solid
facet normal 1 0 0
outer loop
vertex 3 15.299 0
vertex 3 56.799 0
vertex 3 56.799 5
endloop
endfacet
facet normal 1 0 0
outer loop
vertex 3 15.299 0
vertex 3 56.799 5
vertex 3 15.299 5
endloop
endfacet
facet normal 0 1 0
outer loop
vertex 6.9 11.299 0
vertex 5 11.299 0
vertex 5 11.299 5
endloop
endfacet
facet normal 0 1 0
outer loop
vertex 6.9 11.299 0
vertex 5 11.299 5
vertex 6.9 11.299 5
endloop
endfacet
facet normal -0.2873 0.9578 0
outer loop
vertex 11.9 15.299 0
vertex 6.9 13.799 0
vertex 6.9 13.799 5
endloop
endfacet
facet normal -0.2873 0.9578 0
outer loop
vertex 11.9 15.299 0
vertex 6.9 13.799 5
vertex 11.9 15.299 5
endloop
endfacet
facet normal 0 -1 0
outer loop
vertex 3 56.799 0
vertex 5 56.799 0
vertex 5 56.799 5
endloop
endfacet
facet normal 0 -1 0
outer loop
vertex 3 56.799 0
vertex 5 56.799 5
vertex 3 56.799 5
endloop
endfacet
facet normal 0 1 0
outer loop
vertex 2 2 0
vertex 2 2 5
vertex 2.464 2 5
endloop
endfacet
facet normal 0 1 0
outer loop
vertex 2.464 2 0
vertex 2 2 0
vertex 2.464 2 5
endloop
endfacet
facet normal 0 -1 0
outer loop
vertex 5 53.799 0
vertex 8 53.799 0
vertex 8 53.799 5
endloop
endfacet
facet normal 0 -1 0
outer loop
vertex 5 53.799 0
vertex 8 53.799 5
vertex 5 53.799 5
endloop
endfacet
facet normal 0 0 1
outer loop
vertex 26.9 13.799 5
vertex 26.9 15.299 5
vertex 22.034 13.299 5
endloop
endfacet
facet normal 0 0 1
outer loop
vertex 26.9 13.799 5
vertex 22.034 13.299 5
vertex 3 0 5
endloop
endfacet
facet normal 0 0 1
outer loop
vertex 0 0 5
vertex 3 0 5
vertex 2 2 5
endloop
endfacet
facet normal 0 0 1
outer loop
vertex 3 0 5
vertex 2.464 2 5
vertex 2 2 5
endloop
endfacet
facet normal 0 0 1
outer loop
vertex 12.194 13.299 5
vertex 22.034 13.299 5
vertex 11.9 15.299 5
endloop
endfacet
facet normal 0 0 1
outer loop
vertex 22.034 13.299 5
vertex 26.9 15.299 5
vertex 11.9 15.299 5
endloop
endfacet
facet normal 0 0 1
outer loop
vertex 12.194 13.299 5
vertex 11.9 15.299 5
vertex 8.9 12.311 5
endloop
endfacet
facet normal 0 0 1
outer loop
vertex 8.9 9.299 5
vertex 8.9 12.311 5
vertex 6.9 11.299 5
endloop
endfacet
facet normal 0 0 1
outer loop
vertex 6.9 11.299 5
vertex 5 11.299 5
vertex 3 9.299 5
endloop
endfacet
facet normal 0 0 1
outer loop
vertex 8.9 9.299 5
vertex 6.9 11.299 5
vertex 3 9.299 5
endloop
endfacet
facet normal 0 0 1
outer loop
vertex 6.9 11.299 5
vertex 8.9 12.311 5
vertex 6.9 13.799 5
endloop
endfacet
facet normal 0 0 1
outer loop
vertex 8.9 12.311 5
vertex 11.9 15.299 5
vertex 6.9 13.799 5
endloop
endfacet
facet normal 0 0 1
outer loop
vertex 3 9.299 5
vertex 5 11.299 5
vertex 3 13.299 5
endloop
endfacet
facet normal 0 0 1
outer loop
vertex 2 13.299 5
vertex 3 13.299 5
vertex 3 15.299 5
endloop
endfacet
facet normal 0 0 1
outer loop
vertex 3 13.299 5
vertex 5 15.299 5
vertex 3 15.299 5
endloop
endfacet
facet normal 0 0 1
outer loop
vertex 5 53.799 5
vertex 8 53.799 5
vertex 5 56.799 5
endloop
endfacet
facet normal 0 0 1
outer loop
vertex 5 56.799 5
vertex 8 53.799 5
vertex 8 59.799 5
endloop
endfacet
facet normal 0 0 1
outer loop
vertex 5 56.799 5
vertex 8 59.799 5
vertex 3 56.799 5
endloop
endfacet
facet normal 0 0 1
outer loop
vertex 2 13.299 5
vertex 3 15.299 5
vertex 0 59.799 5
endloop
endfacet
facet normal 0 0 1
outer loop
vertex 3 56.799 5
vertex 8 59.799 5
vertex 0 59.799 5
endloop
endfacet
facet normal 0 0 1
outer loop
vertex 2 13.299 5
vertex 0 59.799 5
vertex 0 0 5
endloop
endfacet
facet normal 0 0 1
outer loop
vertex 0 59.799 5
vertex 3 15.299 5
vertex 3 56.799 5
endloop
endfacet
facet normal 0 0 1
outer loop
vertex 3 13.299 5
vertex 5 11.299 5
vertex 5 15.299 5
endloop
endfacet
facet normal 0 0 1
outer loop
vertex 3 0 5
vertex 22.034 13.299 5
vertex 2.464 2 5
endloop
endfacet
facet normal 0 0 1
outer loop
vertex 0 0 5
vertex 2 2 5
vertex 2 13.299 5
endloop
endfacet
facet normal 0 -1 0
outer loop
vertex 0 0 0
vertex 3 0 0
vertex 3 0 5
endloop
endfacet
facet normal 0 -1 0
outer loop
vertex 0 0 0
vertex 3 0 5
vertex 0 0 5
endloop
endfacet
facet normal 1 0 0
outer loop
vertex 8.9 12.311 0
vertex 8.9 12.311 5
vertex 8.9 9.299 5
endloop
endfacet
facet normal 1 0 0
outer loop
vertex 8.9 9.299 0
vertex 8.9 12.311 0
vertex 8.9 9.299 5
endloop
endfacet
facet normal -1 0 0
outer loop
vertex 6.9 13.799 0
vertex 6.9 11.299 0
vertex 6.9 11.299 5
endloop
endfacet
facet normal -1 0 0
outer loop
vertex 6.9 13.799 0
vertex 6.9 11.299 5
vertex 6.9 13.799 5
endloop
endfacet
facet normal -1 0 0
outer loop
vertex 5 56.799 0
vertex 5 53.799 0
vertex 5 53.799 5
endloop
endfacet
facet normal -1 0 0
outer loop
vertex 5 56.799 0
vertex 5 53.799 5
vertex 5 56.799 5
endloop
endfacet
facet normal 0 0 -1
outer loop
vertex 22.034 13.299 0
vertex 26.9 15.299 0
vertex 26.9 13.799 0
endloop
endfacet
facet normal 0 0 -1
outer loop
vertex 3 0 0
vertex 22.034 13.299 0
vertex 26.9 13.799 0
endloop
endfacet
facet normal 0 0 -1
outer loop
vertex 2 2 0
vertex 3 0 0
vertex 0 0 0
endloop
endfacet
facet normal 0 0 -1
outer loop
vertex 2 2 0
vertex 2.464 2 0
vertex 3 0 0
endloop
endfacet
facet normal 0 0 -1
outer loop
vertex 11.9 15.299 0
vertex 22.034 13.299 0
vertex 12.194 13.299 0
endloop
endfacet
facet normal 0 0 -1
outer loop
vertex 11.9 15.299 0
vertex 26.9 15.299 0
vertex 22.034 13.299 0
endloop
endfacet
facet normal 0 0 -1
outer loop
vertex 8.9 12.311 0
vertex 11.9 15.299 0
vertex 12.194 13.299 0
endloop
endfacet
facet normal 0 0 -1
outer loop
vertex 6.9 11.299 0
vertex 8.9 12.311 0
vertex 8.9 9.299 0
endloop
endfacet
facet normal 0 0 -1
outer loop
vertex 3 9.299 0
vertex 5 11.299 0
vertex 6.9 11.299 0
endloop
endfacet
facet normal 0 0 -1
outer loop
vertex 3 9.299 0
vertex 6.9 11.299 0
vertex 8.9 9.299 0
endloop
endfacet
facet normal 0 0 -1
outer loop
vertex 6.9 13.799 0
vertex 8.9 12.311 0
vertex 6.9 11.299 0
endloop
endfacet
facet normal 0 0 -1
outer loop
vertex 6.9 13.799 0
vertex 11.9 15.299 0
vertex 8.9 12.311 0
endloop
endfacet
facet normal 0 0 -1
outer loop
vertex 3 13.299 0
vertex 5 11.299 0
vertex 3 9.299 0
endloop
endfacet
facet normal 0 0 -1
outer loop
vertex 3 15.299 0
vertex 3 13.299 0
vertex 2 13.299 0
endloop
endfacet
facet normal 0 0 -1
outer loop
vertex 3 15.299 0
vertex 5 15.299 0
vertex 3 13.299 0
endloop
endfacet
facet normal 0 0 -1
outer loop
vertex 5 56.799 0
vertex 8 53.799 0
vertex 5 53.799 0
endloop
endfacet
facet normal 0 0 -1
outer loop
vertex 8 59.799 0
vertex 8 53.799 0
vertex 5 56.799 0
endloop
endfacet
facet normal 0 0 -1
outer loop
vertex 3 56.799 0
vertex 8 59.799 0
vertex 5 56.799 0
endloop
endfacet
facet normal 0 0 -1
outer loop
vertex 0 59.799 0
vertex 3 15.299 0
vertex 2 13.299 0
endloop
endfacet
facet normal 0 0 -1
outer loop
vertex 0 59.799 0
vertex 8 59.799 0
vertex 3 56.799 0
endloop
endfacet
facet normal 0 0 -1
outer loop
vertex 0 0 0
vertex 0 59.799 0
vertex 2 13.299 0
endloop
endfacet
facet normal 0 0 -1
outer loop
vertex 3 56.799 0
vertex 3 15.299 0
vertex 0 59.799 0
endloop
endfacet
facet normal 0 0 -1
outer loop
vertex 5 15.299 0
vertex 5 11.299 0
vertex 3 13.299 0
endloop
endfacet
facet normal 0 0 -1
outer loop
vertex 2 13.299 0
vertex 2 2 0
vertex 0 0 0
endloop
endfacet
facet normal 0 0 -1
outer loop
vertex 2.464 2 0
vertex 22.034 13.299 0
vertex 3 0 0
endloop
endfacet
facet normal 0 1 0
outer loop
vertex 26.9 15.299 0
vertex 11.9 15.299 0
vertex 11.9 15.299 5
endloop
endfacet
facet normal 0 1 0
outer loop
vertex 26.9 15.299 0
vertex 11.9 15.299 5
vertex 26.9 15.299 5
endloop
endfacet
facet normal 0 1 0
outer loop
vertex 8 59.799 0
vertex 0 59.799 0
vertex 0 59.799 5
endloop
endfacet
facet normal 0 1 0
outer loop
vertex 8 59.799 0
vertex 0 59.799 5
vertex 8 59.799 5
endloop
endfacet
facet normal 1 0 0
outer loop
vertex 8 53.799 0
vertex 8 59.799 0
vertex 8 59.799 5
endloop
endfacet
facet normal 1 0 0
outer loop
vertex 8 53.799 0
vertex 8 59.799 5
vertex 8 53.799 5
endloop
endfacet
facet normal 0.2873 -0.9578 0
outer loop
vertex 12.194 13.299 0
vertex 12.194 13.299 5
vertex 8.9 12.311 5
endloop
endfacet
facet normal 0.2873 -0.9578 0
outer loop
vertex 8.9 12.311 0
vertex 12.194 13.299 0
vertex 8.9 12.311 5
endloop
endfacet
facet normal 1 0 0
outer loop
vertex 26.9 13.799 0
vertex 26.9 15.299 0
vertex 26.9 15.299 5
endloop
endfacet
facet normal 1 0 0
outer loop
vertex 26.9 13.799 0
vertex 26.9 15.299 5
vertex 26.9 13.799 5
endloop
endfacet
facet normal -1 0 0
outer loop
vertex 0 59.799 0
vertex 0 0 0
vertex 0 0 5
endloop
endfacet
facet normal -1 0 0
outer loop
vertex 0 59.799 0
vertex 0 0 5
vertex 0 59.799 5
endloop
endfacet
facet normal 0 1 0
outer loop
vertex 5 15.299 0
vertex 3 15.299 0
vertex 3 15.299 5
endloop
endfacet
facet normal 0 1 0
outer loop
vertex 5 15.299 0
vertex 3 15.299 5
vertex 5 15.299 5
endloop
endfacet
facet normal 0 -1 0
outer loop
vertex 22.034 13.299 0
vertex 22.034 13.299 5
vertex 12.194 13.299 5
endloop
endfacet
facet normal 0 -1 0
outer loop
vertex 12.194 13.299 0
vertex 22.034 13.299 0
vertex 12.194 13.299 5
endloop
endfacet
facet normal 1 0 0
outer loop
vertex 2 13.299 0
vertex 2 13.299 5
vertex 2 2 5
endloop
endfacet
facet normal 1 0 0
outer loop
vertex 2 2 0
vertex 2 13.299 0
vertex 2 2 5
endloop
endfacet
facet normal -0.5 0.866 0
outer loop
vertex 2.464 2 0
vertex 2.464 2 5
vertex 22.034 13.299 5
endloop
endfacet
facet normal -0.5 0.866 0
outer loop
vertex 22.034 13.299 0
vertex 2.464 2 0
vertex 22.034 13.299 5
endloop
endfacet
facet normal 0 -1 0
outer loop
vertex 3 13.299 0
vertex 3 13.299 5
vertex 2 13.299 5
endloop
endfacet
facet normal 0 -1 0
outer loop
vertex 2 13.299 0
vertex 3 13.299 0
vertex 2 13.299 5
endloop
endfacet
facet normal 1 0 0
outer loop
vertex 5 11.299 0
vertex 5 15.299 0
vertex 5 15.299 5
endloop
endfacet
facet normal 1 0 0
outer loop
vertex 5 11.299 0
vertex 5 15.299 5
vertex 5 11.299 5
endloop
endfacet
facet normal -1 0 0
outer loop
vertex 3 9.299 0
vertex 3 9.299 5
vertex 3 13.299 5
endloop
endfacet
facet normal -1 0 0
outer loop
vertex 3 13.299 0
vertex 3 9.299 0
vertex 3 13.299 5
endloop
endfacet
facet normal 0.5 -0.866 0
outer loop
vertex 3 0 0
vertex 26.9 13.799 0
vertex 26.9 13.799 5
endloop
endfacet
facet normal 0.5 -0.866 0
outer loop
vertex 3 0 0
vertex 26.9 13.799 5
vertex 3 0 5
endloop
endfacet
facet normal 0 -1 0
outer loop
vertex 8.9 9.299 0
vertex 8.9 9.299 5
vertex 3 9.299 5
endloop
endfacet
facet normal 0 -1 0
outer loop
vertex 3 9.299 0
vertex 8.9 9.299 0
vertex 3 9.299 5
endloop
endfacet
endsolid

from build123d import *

# Parameters (mm, degrees)
EXTRUDE_1_DEPTH     = 5
CUT_EXTRUDE_1_DEPTH = 66.760863021


with BuildPart() as part:
    # 草图1 → 凸台-拉伸1 (new body)
    with BuildSketch(Plane.XY):
        Polygon((0, 0), (0, 59.798671434), (8, 59.798671434), (8, 53.798671434), (5, 53.798671434), (5, 56.798671434), (3, 56.798671434), (3, 15.298671434), (5, 15.298671434), (5, 11.298671434), (6.9, 11.298671434), (6.9, 13.798671434), (11.9, 15.298671434), (26.9, 15.298671434), (26.9, 13.798671434), (3, 0), align=None)
    extrude(amount=EXTRUDE_1_DEPTH)

    # 草图2 → 切除-拉伸1 (cut, through all)
    with BuildSketch(Plane.XY.offset(5)):
        Polygon((22.033974596, 13.298671434), (12.193537673, 13.298671434), (8.9, 12.310610132), (8.9, 9.298671434), (3, 9.298671434), (3, 13.298671434), (2, 13.298671434), (2, 2), (2.464101615, 2), align=None)
    extrude(amount=-CUT_EXTRUDE_1_DEPTH, mode=Mode.SUBTRACT)


solid = part.part
